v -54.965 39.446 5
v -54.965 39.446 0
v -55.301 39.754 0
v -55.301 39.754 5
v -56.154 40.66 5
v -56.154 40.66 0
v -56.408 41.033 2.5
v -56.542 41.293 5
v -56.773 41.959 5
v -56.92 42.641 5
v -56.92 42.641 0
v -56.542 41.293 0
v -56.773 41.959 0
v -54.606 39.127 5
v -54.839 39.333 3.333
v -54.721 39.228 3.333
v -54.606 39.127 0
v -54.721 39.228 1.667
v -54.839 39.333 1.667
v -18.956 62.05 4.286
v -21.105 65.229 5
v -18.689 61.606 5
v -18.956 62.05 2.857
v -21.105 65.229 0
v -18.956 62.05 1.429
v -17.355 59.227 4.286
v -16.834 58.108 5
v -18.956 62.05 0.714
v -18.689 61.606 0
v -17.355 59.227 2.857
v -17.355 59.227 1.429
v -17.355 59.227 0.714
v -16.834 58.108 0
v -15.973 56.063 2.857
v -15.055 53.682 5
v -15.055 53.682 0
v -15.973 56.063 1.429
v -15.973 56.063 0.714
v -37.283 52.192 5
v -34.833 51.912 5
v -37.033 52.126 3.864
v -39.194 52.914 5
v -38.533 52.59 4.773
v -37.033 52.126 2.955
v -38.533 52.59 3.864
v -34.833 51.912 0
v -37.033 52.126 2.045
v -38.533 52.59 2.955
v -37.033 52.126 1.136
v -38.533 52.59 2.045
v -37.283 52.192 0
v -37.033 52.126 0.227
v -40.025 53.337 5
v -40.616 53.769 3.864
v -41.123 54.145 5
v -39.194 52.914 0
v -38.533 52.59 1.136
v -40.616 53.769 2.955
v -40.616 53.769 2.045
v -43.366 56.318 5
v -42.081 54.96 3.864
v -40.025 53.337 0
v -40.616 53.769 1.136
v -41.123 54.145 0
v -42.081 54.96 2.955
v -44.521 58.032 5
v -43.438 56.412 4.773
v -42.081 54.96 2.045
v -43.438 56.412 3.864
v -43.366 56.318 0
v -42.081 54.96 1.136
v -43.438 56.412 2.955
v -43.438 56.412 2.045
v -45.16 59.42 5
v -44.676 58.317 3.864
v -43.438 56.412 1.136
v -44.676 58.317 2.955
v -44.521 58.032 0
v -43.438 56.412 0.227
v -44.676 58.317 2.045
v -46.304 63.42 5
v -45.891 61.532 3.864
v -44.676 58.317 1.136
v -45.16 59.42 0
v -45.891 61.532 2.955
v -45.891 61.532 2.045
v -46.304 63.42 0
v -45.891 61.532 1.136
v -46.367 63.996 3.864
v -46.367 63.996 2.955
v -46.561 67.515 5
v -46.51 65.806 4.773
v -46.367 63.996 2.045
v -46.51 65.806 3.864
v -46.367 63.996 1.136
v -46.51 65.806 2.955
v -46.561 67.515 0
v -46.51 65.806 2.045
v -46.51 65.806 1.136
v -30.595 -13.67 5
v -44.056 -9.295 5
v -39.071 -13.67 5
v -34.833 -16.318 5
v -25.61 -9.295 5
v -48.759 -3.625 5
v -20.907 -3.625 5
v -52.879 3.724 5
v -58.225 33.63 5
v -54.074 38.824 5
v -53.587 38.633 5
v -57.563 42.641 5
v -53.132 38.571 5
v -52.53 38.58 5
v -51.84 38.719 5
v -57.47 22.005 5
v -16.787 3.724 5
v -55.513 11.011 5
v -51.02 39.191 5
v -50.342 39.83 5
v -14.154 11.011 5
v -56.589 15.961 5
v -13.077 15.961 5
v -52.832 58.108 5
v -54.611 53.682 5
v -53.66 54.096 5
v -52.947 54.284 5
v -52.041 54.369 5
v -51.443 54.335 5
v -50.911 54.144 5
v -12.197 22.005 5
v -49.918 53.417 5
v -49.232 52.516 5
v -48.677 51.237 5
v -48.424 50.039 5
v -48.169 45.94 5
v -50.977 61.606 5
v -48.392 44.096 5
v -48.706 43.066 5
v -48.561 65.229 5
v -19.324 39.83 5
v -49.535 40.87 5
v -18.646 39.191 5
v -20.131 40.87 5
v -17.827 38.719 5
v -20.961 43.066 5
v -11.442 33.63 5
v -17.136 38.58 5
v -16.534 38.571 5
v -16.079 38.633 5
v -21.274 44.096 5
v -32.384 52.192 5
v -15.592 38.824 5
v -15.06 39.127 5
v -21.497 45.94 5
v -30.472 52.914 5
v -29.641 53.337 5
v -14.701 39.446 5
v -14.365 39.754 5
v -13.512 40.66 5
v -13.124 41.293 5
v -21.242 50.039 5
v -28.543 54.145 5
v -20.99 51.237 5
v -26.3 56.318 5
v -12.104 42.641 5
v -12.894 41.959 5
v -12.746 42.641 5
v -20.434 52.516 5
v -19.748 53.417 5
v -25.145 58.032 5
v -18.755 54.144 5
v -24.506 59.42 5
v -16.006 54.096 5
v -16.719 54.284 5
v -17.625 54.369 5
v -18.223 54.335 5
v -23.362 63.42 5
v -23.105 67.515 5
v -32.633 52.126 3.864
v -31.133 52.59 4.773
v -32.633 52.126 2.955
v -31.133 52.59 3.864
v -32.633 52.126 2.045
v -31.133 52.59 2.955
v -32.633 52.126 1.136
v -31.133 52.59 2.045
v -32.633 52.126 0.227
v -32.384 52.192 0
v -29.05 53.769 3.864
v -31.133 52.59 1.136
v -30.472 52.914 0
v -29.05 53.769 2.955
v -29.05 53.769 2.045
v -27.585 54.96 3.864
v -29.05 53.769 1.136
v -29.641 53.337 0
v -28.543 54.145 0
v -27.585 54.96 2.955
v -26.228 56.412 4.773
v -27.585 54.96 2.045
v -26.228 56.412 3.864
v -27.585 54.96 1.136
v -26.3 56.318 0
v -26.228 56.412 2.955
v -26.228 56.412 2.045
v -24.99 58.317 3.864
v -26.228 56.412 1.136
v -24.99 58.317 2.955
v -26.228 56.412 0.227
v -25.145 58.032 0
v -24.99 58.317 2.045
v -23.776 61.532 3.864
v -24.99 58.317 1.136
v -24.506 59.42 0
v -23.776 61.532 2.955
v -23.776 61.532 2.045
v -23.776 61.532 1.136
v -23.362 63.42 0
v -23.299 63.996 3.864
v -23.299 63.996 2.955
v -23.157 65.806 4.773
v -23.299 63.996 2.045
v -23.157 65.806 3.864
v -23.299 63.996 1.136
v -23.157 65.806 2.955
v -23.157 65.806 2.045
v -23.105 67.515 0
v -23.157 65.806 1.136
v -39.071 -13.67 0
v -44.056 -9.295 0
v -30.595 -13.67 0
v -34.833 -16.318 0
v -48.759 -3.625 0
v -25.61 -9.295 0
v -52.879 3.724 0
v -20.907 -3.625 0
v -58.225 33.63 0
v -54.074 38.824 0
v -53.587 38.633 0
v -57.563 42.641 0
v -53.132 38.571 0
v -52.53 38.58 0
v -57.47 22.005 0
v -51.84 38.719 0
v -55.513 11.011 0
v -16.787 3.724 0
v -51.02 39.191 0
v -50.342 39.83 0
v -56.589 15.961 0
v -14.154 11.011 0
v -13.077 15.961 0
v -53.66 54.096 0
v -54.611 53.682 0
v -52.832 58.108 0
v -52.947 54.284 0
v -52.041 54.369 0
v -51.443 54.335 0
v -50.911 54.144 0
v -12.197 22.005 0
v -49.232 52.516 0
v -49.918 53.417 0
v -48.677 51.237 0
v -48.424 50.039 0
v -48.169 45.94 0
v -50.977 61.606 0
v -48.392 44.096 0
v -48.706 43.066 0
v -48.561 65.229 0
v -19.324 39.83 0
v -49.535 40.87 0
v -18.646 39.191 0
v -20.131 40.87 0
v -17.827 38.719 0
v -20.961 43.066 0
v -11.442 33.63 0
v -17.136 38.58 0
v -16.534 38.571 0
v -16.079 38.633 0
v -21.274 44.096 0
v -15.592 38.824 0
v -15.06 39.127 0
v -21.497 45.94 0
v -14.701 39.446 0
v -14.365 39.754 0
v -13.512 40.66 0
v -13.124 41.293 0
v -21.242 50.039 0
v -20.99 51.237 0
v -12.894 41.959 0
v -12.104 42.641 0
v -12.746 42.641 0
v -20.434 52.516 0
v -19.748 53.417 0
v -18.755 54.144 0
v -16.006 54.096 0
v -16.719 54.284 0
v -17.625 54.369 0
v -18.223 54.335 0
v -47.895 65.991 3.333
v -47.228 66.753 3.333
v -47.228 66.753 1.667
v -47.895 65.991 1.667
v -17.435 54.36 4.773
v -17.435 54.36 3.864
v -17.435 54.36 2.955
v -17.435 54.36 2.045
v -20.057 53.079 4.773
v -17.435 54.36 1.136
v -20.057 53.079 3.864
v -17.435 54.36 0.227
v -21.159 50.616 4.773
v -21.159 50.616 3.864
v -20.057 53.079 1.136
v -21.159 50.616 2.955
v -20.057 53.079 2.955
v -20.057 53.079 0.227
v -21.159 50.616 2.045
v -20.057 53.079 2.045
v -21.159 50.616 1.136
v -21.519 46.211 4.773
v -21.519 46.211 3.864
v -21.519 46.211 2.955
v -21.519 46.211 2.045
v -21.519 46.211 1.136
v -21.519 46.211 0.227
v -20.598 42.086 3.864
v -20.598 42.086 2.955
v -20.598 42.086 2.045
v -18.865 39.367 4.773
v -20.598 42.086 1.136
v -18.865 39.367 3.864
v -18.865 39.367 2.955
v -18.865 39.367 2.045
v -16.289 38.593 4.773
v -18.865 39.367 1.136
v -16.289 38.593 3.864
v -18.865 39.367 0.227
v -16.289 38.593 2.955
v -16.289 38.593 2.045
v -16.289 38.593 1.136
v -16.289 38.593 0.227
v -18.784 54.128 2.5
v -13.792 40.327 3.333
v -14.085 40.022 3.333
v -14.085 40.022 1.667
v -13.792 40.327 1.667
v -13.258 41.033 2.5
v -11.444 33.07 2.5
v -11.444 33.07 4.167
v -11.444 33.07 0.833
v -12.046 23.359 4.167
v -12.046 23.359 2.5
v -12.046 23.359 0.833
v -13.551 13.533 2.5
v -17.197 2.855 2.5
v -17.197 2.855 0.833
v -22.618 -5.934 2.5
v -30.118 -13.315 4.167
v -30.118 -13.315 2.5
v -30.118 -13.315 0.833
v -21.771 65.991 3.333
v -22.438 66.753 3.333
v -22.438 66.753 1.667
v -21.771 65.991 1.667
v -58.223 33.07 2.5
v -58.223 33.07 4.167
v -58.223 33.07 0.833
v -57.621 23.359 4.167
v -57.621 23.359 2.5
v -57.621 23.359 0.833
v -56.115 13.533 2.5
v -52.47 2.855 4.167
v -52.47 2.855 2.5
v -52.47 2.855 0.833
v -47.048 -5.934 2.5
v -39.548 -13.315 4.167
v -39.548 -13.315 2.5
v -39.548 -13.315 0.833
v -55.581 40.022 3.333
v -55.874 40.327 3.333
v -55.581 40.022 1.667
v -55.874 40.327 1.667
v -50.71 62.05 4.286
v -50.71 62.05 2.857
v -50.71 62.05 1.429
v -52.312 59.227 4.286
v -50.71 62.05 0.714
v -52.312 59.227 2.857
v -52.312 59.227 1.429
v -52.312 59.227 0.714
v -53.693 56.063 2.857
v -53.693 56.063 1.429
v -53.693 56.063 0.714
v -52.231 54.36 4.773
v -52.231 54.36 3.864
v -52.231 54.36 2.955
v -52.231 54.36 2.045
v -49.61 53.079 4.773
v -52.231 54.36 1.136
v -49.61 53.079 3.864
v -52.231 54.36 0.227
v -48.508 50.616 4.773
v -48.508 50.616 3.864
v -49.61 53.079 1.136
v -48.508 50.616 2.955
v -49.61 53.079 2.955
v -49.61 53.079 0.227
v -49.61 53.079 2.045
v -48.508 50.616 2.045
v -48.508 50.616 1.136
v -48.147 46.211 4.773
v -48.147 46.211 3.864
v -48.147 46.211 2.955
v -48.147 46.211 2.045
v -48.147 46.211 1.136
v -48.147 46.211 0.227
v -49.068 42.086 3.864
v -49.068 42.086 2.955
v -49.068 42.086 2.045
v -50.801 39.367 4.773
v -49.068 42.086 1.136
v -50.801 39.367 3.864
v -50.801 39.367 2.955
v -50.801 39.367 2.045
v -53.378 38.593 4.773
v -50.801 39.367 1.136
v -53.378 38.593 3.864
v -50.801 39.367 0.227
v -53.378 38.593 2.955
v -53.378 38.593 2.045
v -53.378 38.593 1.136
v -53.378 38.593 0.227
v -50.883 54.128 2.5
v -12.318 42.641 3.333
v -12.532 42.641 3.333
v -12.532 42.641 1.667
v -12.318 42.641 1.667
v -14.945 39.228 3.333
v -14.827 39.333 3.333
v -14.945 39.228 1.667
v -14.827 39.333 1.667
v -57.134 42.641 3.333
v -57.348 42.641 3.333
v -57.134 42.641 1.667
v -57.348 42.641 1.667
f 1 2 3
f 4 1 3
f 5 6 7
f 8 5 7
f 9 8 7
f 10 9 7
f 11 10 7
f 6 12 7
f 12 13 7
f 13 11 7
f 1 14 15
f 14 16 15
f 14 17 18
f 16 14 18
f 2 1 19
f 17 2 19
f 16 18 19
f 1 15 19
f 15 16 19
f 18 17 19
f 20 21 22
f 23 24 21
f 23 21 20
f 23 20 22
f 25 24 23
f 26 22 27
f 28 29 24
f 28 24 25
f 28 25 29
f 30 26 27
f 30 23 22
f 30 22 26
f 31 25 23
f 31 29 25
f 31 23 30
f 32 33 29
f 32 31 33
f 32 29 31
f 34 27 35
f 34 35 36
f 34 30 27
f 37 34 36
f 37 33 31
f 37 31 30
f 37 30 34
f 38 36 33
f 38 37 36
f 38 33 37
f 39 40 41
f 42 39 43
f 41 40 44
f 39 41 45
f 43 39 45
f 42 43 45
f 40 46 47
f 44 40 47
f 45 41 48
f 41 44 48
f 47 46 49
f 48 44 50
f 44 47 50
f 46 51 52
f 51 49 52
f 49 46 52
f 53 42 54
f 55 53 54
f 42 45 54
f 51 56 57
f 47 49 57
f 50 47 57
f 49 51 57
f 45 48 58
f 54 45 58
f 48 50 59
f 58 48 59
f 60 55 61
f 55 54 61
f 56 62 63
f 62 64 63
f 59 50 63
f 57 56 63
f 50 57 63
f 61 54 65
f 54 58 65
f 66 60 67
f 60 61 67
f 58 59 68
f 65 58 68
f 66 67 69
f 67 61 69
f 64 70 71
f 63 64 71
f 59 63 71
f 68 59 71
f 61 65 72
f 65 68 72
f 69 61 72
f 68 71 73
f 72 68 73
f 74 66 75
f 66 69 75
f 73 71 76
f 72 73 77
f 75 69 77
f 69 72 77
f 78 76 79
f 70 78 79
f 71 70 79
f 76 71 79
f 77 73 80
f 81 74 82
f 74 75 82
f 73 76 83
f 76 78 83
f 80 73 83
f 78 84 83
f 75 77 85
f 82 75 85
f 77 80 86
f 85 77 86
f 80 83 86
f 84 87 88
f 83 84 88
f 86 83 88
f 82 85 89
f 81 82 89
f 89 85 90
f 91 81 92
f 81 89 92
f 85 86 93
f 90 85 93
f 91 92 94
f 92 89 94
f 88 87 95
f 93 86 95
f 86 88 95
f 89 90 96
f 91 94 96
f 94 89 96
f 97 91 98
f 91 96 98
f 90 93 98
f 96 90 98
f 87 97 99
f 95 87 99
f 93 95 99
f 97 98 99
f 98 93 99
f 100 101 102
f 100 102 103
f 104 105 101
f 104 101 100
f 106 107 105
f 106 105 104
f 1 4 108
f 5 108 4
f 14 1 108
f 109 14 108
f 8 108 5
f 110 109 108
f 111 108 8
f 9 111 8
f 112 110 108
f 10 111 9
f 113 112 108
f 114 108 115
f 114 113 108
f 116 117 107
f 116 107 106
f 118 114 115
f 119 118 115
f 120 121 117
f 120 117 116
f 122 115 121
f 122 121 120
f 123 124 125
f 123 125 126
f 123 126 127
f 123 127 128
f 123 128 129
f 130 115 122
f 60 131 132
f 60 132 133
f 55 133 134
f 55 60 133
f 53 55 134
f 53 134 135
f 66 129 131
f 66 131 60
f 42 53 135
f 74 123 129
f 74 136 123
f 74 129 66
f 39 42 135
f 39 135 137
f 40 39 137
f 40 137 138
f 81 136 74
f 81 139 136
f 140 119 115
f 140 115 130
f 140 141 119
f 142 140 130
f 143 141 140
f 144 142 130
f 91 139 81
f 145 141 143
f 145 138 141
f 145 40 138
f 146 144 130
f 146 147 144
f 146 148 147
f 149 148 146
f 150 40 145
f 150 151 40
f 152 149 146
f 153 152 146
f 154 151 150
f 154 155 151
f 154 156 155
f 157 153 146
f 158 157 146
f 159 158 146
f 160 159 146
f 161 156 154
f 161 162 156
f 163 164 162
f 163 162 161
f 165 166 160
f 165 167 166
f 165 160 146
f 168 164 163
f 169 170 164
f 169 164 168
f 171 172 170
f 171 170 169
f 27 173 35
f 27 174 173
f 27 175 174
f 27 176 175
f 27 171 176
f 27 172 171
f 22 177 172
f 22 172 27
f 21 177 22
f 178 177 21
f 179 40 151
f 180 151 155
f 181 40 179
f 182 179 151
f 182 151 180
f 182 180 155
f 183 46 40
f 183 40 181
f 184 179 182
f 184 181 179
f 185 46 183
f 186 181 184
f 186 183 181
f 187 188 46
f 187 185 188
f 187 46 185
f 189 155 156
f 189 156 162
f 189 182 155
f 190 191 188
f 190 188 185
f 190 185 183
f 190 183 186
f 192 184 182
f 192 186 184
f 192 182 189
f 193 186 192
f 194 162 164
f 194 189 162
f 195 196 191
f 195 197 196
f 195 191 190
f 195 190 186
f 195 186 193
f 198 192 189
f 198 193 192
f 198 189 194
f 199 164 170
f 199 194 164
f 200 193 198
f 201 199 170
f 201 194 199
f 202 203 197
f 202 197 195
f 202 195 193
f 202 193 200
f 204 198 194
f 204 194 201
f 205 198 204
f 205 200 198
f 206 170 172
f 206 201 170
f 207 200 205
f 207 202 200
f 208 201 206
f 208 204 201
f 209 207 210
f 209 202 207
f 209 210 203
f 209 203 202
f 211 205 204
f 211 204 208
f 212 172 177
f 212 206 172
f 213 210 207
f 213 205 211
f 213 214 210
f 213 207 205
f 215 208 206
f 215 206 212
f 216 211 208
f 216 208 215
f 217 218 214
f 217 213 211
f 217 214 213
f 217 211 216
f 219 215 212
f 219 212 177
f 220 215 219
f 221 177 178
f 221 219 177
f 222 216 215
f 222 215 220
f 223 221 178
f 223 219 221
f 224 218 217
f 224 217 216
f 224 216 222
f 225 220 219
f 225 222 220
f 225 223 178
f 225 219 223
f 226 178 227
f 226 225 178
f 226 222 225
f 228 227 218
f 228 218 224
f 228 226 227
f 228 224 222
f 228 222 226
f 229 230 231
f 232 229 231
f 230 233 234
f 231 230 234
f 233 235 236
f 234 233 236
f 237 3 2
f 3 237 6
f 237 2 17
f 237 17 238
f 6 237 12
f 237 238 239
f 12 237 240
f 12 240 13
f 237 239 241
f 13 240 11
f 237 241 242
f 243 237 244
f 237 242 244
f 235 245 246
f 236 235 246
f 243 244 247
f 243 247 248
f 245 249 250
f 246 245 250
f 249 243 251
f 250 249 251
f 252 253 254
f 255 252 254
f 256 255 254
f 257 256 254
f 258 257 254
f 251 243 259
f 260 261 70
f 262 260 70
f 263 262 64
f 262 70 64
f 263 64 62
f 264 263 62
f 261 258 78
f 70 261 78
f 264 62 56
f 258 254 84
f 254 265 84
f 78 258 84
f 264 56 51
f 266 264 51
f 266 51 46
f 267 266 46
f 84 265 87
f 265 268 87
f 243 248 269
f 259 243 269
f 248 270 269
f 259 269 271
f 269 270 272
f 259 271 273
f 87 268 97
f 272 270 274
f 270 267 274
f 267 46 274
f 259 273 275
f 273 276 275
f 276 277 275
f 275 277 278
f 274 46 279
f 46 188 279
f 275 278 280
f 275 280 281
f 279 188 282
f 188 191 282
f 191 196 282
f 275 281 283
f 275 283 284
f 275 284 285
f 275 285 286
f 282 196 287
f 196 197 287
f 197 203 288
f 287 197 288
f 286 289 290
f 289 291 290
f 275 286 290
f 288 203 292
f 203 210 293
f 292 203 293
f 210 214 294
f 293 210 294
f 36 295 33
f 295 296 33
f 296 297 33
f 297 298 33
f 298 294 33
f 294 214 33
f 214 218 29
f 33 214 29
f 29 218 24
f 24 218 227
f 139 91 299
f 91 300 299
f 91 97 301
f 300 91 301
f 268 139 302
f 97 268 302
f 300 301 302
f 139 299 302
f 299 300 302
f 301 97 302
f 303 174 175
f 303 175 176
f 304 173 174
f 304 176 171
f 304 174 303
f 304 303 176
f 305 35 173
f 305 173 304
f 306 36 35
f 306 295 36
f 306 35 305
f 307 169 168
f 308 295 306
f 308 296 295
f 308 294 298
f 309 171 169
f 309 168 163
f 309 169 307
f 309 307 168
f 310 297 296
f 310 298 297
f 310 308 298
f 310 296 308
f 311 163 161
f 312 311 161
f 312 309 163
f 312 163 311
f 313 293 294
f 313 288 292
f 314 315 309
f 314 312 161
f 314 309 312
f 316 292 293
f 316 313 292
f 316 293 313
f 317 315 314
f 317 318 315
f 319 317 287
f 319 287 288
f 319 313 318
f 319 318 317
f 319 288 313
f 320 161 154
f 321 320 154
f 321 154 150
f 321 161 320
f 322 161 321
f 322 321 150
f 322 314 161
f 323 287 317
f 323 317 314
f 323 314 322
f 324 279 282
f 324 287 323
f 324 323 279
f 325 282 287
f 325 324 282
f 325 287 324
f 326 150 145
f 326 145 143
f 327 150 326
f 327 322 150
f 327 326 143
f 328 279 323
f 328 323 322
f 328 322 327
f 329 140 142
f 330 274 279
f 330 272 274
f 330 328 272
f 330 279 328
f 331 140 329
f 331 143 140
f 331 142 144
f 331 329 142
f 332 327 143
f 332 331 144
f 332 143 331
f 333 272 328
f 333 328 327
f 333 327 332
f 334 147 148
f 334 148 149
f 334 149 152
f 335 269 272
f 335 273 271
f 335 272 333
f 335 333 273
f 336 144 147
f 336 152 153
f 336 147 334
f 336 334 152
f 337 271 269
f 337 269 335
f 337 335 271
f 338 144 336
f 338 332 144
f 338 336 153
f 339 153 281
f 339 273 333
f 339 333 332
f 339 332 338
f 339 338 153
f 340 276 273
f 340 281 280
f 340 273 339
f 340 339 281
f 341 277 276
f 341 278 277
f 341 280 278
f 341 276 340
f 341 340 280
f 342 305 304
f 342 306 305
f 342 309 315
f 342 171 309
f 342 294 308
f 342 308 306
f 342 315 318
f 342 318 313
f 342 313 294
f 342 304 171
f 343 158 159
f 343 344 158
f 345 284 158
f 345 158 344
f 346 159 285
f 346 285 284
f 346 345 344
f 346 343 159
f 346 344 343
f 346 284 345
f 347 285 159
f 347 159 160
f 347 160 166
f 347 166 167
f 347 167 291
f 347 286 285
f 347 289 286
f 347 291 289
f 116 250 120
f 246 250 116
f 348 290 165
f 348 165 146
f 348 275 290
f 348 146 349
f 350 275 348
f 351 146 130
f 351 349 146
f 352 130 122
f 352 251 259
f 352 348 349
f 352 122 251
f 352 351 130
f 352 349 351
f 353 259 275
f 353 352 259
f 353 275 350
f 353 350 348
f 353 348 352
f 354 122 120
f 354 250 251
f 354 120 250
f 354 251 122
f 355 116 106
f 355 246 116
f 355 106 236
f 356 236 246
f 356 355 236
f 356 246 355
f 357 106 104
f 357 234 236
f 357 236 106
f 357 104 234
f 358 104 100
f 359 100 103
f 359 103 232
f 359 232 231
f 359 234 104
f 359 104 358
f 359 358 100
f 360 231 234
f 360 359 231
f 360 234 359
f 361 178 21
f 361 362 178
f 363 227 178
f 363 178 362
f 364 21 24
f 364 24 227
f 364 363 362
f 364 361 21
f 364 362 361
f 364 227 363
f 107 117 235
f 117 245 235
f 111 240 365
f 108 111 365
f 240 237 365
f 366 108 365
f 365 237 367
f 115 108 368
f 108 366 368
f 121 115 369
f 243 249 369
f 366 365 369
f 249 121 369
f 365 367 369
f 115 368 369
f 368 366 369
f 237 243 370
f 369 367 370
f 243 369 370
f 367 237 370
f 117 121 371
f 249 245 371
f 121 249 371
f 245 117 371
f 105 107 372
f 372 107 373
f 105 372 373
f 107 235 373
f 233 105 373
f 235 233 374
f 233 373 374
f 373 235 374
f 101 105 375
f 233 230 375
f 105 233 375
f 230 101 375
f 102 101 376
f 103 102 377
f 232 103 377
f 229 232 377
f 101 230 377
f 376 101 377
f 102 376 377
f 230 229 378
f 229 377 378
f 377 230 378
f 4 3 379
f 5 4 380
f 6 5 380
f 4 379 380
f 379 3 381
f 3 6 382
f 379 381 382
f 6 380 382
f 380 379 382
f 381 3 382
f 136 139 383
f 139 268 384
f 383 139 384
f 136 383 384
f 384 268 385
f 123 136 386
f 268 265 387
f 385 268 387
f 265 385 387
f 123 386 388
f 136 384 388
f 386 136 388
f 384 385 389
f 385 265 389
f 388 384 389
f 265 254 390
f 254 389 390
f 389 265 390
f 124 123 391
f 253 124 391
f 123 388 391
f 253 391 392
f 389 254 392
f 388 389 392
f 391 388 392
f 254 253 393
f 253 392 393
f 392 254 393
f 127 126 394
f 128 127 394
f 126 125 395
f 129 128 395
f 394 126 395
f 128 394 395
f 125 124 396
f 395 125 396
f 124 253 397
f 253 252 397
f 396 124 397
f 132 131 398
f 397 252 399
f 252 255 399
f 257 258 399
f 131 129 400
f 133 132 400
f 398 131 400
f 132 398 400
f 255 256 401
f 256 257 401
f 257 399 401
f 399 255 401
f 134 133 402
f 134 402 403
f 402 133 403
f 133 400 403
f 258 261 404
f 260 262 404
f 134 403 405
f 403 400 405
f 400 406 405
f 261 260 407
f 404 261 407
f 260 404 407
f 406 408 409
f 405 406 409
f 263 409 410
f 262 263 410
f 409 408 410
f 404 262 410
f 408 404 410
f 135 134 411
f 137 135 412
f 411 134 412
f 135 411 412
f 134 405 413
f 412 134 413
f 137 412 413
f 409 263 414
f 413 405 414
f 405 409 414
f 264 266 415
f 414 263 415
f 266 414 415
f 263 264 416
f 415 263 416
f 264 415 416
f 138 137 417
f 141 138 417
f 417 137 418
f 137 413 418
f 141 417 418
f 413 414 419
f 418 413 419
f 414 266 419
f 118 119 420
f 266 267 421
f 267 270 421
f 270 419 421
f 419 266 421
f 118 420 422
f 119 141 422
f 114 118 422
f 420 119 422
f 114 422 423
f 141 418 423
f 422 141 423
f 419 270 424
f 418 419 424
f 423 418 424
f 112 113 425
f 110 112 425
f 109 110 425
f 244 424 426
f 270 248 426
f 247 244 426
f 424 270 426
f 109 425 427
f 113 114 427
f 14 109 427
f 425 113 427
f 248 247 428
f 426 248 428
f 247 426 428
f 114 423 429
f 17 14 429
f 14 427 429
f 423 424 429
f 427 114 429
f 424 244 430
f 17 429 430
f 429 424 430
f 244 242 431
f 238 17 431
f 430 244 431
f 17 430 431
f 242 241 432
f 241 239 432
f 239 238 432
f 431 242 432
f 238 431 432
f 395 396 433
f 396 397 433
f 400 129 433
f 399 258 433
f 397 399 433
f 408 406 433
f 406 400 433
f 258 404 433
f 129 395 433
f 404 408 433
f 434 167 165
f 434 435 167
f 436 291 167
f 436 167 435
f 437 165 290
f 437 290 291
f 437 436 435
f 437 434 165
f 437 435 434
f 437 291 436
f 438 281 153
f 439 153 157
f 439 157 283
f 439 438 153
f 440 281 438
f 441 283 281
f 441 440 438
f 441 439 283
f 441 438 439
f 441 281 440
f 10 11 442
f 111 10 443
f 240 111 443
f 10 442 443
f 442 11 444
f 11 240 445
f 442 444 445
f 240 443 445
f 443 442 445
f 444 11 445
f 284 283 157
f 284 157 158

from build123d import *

# Parameters (mm, degrees)
F1_DEPTH = 5


with BuildPart() as f1:
    # F0 (on Top) → F1 (new body)
    with BuildSketch(Plane.XY):
        with BuildLine():
            add(Edge.make_bspline(
                [(-57.5626678765, 42.6406040788), (-57.9080562921, 39.8362415044), (-58.7477625906, 33.018291596), (-56.7466207027, 13.2638324141), (-52.8291963564, 2.9733901681), (-47.5742402511, -6.1031265313), (-39.8588097864, -13.4804555699), (-36.3235197152, -15.4765553984), (-34.8331145942, -16.3180697709)],
                knots=[0, 0, 0, 0, 0.1571384934, 0.3820341872, 0.5524442159, 0.7154761313, 0.880050626, 1, 1, 1, 1], degree=3))
            Line((-34.8331145942, -16.3180697709), (-34.8331145942, 51.9118197262))
            add(Edge.make_bspline(
                [(-34.8331145942, 51.9118197262), (-35.2119563545, 51.9185959347), (-35.9580977588, 51.9319419017), (-37.0348440475, 52.1008517041), (-37.751583743, 52.3413787982), (-38.5534512152, 52.5661302145), (-39.1045545857, 52.8892692232), (-39.9530807974, 53.242750596), (-40.6024267483, 53.772012849), (-41.4634310205, 54.3811984195), (-42.0706109603, 54.9524802776), (-42.9037456065, 55.720108633), (-43.4259718244, 56.3914555617), (-43.9234358745, 57.0589950526), (-44.2302322209, 57.5786939094), (-44.7376887484, 58.3206849113), (-45.4837434911, 60.2315423487), (-45.9027412703, 61.4635918917), (-46.1149072684, 62.587386495), (-46.2910492058, 63.1994502703), (-46.3665046988, 64.0072029965), (-46.457462946, 64.8854328545), (-46.519316114, 65.8331058884), (-46.5460145844, 66.9017915796), (-46.5613380075, 67.5151571631)],
                knots=[0, 0, 0, 0, 0.0493610993, 0.0972183213, 0.1377301504, 0.1791101827, 0.2163531524, 0.2599263059, 0.3028340171, 0.3496999184, 0.3925564746, 0.4412704382, 0.4846073731, 0.5261866583, 0.5613175523, 0.6048162611, 0.6709705647, 0.7254358561, 0.7735910677, 0.8104237672, 0.8515345399, 0.8947116941, 0.939570424, 1, 1, 1, 1], degree=3))
            add(Edge.make_bspline(
                [(-46.5613380075, 67.5151571631), (-47.2280532122, 66.7531962196), (-47.8947684169, 65.9912352761), (-48.5614836216, 65.2292743325)],
                knots=[0, 0, 0, 0, 3.0374072485, 3.0374072485, 3.0374072485, 3.0374072485], degree=3))
            add(Edge.make_bspline(
                [(-48.5614836216, 65.2292743325), (-48.9735694738, 64.7136433972), (-49.7863729956, 63.6966043776), (-50.6916211477, 62.0419000493), (-51.5394060192, 60.7181023455), (-52.3324629663, 59.2186716244), (-52.9254322483, 57.9124520433), (-53.7256402788, 56.0234412783), (-54.3032039704, 54.4922006053), (-54.6109952031, 53.6815354107)],
                knots=[0, 0, 0, 0, 0.1473527895, 0.2906803309, 0.4229073329, 0.5579037502, 0.6834554494, 0.8324703555, 1, 1, 1, 1], degree=3))
            add(Edge.make_bspline(
                [(-54.6109952031, 53.6815354107), (-54.1490167087, 53.8989858417), (-53.3838791321, 54.2576504993), (-52.2461372119, 54.37354881), (-51.3518225299, 54.3873217778), (-50.5313887829, 53.9583071647), (-49.5211267731, 53.1279307693), (-48.8411316868, 51.797376606), (-48.4783197566, 50.6331243975), (-48.4119479233, 49.8877598597), (-48.3026124514, 48.9386253318), (-48.1973480176, 48.009616531), (-48.071268063, 46.2101292746), (-48.3446637999, 44.8877932345), (-48.333153973, 43.9230372084), (-49.1109571235, 42.0884729348), (-49.3749084991, 41.0183008159), (-50.0069662335, 40.2196283926), (-50.7492629002, 39.336743191), (-51.5427317075, 38.8453486879), (-52.1317926314, 38.5710112066), (-53.4087673752, 38.5344057135), (-53.9588643746, 38.7602882902), (-54.4148685339, 38.9915837878), (-54.6061547794, 39.1268395676)],
                knots=[0, 0, 0, 0, 0.0445420475, 0.0845400391, 0.1197214949, 0.1554017993, 0.1984744889, 0.2451509962, 0.2866397794, 0.3193912307, 0.3554993097, 0.3927526907, 0.4436884008, 0.4874368635, 0.5247166115, 0.5776970761, 0.6179417164, 0.6554167928, 0.6964030165, 0.732305622, 0.7631963792, 0.8049886746, 0.8359919351, 0.8636682784, 0.8636682784, 0.8636682784, 0.8636682784], degree=3))
            add(Edge.make_bspline(
                [(-54.6061547794, 39.1268395676), (-54.6592591816, 39.1643889341), (-54.7889448477, 39.2644677015), (-54.8995408977, 39.3780040162), (-54.9651332554, 39.4462250728)],
                knots=[0.8636682784, 0.8636682784, 0.8636682784, 0.8636682784, 0.8713517146, 0.8831028995, 0.8831028995, 0.8831028995, 0.8831028995], degree=3))
            add(Edge.make_bspline(
                [(-54.9651332554, 39.4462250728), (-55.0422718783, 39.5157558174), (-55.1496780772, 39.6135140467), (-55.2724769461, 39.7270938328), (-55.3011469605, 39.7537806896)],
                knots=[0.1606199003, 0.1606199003, 0.1606199003, 0.1606199003, 0.2554193728, 0.2834344333, 0.2834344333, 0.2834344333, 0.2834344333], degree=3))
            add(Edge.make_bspline(
                [(-55.3011469605, 39.7537806896), (-55.3239737809, 39.7694364315), (-55.5998529876, 39.9433833713), (-56.0474560794, 39.9919072855), (-56.1453497064, 40.5782185414), (-56.1541033084, 40.6599148874)],
                knots=[0.9022974714, 0.9022974714, 0.9022974714, 0.9022974714, 0.905798506, 0.9433289244, 0.9488544637, 0.9488544637, 0.9488544637, 0.9488544637], degree=3))
            add(Edge.make_bspline(
                [(-56.1541033084, 40.6599148874), (-56.2472964392, 40.7810745041), (-56.6797268519, 41.4080624482), (-56.8130311576, 42.0925613255), (-56.9197610021, 42.6406040788)],
                knots=[0.5429117903, 0.5429117903, 0.5429117903, 0.5429117903, 0.6340331748, 1, 1, 1, 1], degree=3))
            add(Edge.make_bspline(
                [(-56.9197610021, 42.6406040788), (-57.1340632935, 42.6406040788), (-57.348365585, 42.6406040788), (-57.5626678765, 42.6406040788)],
                knots=[0, 0, 0, 0, 0.6429068744, 0.6429068744, 0.6429068744, 0.6429068744], degree=3))
        make_face()
        with BuildLine():
            Line((-34.8331145942, 51.9118197262), (-34.8331145942, -16.3180697709))
            add(Edge.make_bspline(
                [(-12.103561312, 42.6406040788), (-11.7581728963, 39.8362415044), (-10.9184665978, 33.018291596), (-12.9196084857, 13.2638324141), (-16.8370328321, 2.9733901681), (-22.0919889373, -6.1031265313), (-29.8074194021, -13.4804555699), (-33.3427094733, -15.4765553984), (-34.8331145942, -16.3180697709)],
                knots=[0, 0, 0, 0, 0.1571384934, 0.3820341872, 0.5524442159, 0.7154761313, 0.880050626, 1, 1, 1, 1], degree=3))
            add(Edge.make_bspline(
                [(-12.7464681864, 42.6406040788), (-12.5321658949, 42.6406040788), (-12.3178636034, 42.6406040788), (-12.103561312, 42.6406040788)],
                knots=[0, 0, 0, 0, 0.6429068744, 0.6429068744, 0.6429068744, 0.6429068744], degree=3))
            add(Edge.make_bspline(
                [(-13.51212588, 40.6599148874), (-13.4189327492, 40.7810745041), (-12.9865023366, 41.4080624482), (-12.8531980309, 42.0925613255), (-12.7464681864, 42.6406040788)],
                knots=[0.5429117903, 0.5429117903, 0.5429117903, 0.5429117903, 0.6340331748, 1, 1, 1, 1], degree=3))
            add(Edge.make_bspline(
                [(-14.3650822279, 39.7537806896), (-14.3422554076, 39.7694364315), (-14.0663762008, 39.9433833713), (-13.618773109, 39.9919072855), (-13.5208794821, 40.5782185414), (-13.51212588, 40.6599148874)],
                knots=[0.9022974714, 0.9022974714, 0.9022974714, 0.9022974714, 0.905798506, 0.9433289244, 0.9488544637, 0.9488544637, 0.9488544637, 0.9488544637], degree=3))
            add(Edge.make_bspline(
                [(-14.7010959331, 39.4462250728), (-14.6239573101, 39.5157558174), (-14.5165511113, 39.6135140467), (-14.3937522423, 39.7270938328), (-14.3650822279, 39.7537806896)],
                knots=[0.1606199003, 0.1606199003, 0.1606199003, 0.1606199003, 0.2554193728, 0.2834344333, 0.2834344333, 0.2834344333, 0.2834344333], degree=3))
            add(Edge.make_bspline(
                [(-15.0600744091, 39.1268395676), (-15.0069700068, 39.1643889341), (-14.8772843408, 39.2644677015), (-14.7666882907, 39.3780040162), (-14.7010959331, 39.4462250728)],
                knots=[0.8636682784, 0.8636682784, 0.8636682784, 0.8636682784, 0.8713517146, 0.8831028995, 0.8831028995, 0.8831028995, 0.8831028995], degree=3))
            add(Edge.make_bspline(
                [(-15.0552339853, 53.6815354107), (-15.5172124798, 53.8989858417), (-16.2823500564, 54.2576504993), (-17.4200919766, 54.37354881), (-18.3144066585, 54.3873217778), (-19.1348404055, 53.9583071647), (-20.1451024154, 53.1279307693), (-20.8250975017, 51.797376606), (-21.1879094318, 50.6331243975), (-21.2542812651, 49.8877598597), (-21.363616737, 48.9386253318), (-21.4688811708, 48.009616531), (-21.5949611255, 46.2101292746), (-21.3215653885, 44.8877932345), (-21.3330752154, 43.9230372084), (-20.555272065, 42.0884729348), (-20.2913206893, 41.0183008159), (-19.6592629549, 40.2196283926), (-18.9169662882, 39.336743191), (-18.123497481, 38.8453486879), (-17.5344365571, 38.5710112066), (-16.2574618133, 38.5344057135), (-15.7073648139, 38.7602882902), (-15.2513606546, 38.9915837878), (-15.0600744091, 39.1268395676)],
                knots=[0, 0, 0, 0, 0.0445420475, 0.0845400391, 0.1197214949, 0.1554017993, 0.1984744889, 0.2451509962, 0.2866397794, 0.3193912307, 0.3554993097, 0.3927526907, 0.4436884008, 0.4874368635, 0.5247166115, 0.5776970761, 0.6179417164, 0.6554167928, 0.6964030165, 0.732305622, 0.7631963792, 0.8049886746, 0.8359919351, 0.8636682784, 0.8636682784, 0.8636682784, 0.8636682784], degree=3))
            add(Edge.make_bspline(
                [(-21.1047455668, 65.2292743325), (-20.6926597146, 64.7136433972), (-19.8798561928, 63.6966043776), (-18.9746080407, 62.0419000493), (-18.1268231693, 60.7181023455), (-17.3337662222, 59.2186716244), (-16.7407969402, 57.9124520433), (-15.9405889096, 56.0234412783), (-15.363025218, 54.4922006053), (-15.0552339853, 53.6815354107)],
                knots=[0, 0, 0, 0, 0.1473527895, 0.2906803309, 0.4229073329, 0.5579037502, 0.6834554494, 0.8324703555, 1, 1, 1, 1], degree=3))
            add(Edge.make_bspline(
                [(-23.104891181, 67.5151571631), (-22.4381759763, 66.7531962196), (-21.7714607716, 65.9912352761), (-21.1047455668, 65.2292743325)],
                knots=[0, 0, 0, 0, 3.0374072485, 3.0374072485, 3.0374072485, 3.0374072485], degree=3))
            add(Edge.make_bspline(
                [(-34.8331145942, 51.9118197262), (-34.4542728339, 51.9185959347), (-33.7081314296, 51.9319419017), (-32.6313851409, 52.1008517041), (-31.9146454455, 52.3413787982), (-31.1127779733, 52.5661302145), (-30.5616746027, 52.8892692232), (-29.713148391, 53.242750596), (-29.0638024401, 53.772012849), (-28.202798168, 54.3811984195), (-27.5956182281, 54.9524802776), (-26.762483582, 55.720108633), (-26.240257364, 56.3914555617), (-25.7427933139, 57.0589950526), (-25.4359969675, 57.5786939094), (-24.92854044, 58.3206849113), (-24.1824856973, 60.2315423487), (-23.7634879182, 61.4635918917), (-23.55132192, 62.587386495), (-23.3751799827, 63.1994502703), (-23.2997244896, 64.0072029965), (-23.2087662424, 64.8854328545), (-23.1469130745, 65.8331058884), (-23.120214604, 66.9017915796), (-23.104891181, 67.5151571631)],
                knots=[0, 0, 0, 0, 0.0493610993, 0.0972183213, 0.1377301504, 0.1791101827, 0.2163531524, 0.2599263059, 0.3028340171, 0.3496999184, 0.3925564746, 0.4412704382, 0.4846073731, 0.5261866583, 0.5613175523, 0.6048162611, 0.6709705647, 0.7254358561, 0.7735910677, 0.8104237672, 0.8515345399, 0.8947116941, 0.939570424, 1, 1, 1, 1], degree=3))
        make_face()
        with BuildLine():
            add(Edge.make_bspline(
                [(-55.3011469605, 39.7537806896), (-55.566690544, 40.0009561348), (-55.8887264446, 40.3149006271), (-56.1541033084, 40.6599148874)],
                knots=[0.2834344333, 0.2834344333, 0.2834344333, 0.2834344333, 0.5429117903, 0.5429117903, 0.5429117903, 0.5429117903], degree=3))
            add(Edge.make_bspline(
                [(-55.3011469605, 39.7537806896), (-55.3239737809, 39.7694364315), (-55.5998529876, 39.9433833713), (-56.0474560794, 39.9919072855), (-56.1453497064, 40.5782185414), (-56.1541033084, 40.6599148874)],
                knots=[0.9022974714, 0.9022974714, 0.9022974714, 0.9022974714, 0.905798506, 0.9433289244, 0.9488544637, 0.9488544637, 0.9488544637, 0.9488544637], degree=3))
        make_face()
        with BuildLine():
            add(Edge.make_bspline(
                [(-14.3650822279, 39.7537806896), (-14.3422554076, 39.7694364315), (-14.0663762008, 39.9433833713), (-13.618773109, 39.9919072855), (-13.5208794821, 40.5782185414), (-13.51212588, 40.6599148874)],
                knots=[0.9022974714, 0.9022974714, 0.9022974714, 0.9022974714, 0.905798506, 0.9433289244, 0.9488544637, 0.9488544637, 0.9488544637, 0.9488544637], degree=3))
            add(Edge.make_bspline(
                [(-14.3650822279, 39.7537806896), (-14.0995386444, 40.0009561348), (-13.7775027438, 40.3149006271), (-13.51212588, 40.6599148874)],
                knots=[0.2834344333, 0.2834344333, 0.2834344333, 0.2834344333, 0.5429117903, 0.5429117903, 0.5429117903, 0.5429117903], degree=3))
        make_face()
        with BuildLine():
            add(Edge.make_bspline(
                [(-54.6061547794, 39.1268395676), (-54.6592591816, 39.1643889341), (-54.7889448477, 39.2644677015), (-54.8995408977, 39.3780040162), (-54.9651332554, 39.4462250728)],
                knots=[0.8636682784, 0.8636682784, 0.8636682784, 0.8636682784, 0.8713517146, 0.8831028995, 0.8831028995, 0.8831028995, 0.8831028995], degree=3))
            add(Edge.make_bspline(
                [(-54.6061547794, 39.1268395676), (-54.7202955635, 39.2276289267), (-54.8344363476, 39.3284182859), (-54.9651332554, 39.4462250728)],
                knots=[0, 0, 0, 0, 0.1606199003, 0.1606199003, 0.1606199003, 0.1606199003], degree=3))
        make_face()
        with BuildLine():
            add(Edge.make_bspline(
                [(-15.0600744091, 39.1268395676), (-14.945933625, 39.2276289267), (-14.8317928408, 39.3284182859), (-14.7010959331, 39.4462250728)],
                knots=[0, 0, 0, 0, 0.1606199003, 0.1606199003, 0.1606199003, 0.1606199003], degree=3))
            add(Edge.make_bspline(
                [(-15.0600744091, 39.1268395676), (-15.0069700068, 39.1643889341), (-14.8772843408, 39.2644677015), (-14.7666882907, 39.3780040162), (-14.7010959331, 39.4462250728)],
                knots=[0.8636682784, 0.8636682784, 0.8636682784, 0.8636682784, 0.8713517146, 0.8831028995, 0.8831028995, 0.8831028995, 0.8831028995], degree=3))
        make_face()
    extrude(amount=F1_DEPTH)


solid = f1.part
